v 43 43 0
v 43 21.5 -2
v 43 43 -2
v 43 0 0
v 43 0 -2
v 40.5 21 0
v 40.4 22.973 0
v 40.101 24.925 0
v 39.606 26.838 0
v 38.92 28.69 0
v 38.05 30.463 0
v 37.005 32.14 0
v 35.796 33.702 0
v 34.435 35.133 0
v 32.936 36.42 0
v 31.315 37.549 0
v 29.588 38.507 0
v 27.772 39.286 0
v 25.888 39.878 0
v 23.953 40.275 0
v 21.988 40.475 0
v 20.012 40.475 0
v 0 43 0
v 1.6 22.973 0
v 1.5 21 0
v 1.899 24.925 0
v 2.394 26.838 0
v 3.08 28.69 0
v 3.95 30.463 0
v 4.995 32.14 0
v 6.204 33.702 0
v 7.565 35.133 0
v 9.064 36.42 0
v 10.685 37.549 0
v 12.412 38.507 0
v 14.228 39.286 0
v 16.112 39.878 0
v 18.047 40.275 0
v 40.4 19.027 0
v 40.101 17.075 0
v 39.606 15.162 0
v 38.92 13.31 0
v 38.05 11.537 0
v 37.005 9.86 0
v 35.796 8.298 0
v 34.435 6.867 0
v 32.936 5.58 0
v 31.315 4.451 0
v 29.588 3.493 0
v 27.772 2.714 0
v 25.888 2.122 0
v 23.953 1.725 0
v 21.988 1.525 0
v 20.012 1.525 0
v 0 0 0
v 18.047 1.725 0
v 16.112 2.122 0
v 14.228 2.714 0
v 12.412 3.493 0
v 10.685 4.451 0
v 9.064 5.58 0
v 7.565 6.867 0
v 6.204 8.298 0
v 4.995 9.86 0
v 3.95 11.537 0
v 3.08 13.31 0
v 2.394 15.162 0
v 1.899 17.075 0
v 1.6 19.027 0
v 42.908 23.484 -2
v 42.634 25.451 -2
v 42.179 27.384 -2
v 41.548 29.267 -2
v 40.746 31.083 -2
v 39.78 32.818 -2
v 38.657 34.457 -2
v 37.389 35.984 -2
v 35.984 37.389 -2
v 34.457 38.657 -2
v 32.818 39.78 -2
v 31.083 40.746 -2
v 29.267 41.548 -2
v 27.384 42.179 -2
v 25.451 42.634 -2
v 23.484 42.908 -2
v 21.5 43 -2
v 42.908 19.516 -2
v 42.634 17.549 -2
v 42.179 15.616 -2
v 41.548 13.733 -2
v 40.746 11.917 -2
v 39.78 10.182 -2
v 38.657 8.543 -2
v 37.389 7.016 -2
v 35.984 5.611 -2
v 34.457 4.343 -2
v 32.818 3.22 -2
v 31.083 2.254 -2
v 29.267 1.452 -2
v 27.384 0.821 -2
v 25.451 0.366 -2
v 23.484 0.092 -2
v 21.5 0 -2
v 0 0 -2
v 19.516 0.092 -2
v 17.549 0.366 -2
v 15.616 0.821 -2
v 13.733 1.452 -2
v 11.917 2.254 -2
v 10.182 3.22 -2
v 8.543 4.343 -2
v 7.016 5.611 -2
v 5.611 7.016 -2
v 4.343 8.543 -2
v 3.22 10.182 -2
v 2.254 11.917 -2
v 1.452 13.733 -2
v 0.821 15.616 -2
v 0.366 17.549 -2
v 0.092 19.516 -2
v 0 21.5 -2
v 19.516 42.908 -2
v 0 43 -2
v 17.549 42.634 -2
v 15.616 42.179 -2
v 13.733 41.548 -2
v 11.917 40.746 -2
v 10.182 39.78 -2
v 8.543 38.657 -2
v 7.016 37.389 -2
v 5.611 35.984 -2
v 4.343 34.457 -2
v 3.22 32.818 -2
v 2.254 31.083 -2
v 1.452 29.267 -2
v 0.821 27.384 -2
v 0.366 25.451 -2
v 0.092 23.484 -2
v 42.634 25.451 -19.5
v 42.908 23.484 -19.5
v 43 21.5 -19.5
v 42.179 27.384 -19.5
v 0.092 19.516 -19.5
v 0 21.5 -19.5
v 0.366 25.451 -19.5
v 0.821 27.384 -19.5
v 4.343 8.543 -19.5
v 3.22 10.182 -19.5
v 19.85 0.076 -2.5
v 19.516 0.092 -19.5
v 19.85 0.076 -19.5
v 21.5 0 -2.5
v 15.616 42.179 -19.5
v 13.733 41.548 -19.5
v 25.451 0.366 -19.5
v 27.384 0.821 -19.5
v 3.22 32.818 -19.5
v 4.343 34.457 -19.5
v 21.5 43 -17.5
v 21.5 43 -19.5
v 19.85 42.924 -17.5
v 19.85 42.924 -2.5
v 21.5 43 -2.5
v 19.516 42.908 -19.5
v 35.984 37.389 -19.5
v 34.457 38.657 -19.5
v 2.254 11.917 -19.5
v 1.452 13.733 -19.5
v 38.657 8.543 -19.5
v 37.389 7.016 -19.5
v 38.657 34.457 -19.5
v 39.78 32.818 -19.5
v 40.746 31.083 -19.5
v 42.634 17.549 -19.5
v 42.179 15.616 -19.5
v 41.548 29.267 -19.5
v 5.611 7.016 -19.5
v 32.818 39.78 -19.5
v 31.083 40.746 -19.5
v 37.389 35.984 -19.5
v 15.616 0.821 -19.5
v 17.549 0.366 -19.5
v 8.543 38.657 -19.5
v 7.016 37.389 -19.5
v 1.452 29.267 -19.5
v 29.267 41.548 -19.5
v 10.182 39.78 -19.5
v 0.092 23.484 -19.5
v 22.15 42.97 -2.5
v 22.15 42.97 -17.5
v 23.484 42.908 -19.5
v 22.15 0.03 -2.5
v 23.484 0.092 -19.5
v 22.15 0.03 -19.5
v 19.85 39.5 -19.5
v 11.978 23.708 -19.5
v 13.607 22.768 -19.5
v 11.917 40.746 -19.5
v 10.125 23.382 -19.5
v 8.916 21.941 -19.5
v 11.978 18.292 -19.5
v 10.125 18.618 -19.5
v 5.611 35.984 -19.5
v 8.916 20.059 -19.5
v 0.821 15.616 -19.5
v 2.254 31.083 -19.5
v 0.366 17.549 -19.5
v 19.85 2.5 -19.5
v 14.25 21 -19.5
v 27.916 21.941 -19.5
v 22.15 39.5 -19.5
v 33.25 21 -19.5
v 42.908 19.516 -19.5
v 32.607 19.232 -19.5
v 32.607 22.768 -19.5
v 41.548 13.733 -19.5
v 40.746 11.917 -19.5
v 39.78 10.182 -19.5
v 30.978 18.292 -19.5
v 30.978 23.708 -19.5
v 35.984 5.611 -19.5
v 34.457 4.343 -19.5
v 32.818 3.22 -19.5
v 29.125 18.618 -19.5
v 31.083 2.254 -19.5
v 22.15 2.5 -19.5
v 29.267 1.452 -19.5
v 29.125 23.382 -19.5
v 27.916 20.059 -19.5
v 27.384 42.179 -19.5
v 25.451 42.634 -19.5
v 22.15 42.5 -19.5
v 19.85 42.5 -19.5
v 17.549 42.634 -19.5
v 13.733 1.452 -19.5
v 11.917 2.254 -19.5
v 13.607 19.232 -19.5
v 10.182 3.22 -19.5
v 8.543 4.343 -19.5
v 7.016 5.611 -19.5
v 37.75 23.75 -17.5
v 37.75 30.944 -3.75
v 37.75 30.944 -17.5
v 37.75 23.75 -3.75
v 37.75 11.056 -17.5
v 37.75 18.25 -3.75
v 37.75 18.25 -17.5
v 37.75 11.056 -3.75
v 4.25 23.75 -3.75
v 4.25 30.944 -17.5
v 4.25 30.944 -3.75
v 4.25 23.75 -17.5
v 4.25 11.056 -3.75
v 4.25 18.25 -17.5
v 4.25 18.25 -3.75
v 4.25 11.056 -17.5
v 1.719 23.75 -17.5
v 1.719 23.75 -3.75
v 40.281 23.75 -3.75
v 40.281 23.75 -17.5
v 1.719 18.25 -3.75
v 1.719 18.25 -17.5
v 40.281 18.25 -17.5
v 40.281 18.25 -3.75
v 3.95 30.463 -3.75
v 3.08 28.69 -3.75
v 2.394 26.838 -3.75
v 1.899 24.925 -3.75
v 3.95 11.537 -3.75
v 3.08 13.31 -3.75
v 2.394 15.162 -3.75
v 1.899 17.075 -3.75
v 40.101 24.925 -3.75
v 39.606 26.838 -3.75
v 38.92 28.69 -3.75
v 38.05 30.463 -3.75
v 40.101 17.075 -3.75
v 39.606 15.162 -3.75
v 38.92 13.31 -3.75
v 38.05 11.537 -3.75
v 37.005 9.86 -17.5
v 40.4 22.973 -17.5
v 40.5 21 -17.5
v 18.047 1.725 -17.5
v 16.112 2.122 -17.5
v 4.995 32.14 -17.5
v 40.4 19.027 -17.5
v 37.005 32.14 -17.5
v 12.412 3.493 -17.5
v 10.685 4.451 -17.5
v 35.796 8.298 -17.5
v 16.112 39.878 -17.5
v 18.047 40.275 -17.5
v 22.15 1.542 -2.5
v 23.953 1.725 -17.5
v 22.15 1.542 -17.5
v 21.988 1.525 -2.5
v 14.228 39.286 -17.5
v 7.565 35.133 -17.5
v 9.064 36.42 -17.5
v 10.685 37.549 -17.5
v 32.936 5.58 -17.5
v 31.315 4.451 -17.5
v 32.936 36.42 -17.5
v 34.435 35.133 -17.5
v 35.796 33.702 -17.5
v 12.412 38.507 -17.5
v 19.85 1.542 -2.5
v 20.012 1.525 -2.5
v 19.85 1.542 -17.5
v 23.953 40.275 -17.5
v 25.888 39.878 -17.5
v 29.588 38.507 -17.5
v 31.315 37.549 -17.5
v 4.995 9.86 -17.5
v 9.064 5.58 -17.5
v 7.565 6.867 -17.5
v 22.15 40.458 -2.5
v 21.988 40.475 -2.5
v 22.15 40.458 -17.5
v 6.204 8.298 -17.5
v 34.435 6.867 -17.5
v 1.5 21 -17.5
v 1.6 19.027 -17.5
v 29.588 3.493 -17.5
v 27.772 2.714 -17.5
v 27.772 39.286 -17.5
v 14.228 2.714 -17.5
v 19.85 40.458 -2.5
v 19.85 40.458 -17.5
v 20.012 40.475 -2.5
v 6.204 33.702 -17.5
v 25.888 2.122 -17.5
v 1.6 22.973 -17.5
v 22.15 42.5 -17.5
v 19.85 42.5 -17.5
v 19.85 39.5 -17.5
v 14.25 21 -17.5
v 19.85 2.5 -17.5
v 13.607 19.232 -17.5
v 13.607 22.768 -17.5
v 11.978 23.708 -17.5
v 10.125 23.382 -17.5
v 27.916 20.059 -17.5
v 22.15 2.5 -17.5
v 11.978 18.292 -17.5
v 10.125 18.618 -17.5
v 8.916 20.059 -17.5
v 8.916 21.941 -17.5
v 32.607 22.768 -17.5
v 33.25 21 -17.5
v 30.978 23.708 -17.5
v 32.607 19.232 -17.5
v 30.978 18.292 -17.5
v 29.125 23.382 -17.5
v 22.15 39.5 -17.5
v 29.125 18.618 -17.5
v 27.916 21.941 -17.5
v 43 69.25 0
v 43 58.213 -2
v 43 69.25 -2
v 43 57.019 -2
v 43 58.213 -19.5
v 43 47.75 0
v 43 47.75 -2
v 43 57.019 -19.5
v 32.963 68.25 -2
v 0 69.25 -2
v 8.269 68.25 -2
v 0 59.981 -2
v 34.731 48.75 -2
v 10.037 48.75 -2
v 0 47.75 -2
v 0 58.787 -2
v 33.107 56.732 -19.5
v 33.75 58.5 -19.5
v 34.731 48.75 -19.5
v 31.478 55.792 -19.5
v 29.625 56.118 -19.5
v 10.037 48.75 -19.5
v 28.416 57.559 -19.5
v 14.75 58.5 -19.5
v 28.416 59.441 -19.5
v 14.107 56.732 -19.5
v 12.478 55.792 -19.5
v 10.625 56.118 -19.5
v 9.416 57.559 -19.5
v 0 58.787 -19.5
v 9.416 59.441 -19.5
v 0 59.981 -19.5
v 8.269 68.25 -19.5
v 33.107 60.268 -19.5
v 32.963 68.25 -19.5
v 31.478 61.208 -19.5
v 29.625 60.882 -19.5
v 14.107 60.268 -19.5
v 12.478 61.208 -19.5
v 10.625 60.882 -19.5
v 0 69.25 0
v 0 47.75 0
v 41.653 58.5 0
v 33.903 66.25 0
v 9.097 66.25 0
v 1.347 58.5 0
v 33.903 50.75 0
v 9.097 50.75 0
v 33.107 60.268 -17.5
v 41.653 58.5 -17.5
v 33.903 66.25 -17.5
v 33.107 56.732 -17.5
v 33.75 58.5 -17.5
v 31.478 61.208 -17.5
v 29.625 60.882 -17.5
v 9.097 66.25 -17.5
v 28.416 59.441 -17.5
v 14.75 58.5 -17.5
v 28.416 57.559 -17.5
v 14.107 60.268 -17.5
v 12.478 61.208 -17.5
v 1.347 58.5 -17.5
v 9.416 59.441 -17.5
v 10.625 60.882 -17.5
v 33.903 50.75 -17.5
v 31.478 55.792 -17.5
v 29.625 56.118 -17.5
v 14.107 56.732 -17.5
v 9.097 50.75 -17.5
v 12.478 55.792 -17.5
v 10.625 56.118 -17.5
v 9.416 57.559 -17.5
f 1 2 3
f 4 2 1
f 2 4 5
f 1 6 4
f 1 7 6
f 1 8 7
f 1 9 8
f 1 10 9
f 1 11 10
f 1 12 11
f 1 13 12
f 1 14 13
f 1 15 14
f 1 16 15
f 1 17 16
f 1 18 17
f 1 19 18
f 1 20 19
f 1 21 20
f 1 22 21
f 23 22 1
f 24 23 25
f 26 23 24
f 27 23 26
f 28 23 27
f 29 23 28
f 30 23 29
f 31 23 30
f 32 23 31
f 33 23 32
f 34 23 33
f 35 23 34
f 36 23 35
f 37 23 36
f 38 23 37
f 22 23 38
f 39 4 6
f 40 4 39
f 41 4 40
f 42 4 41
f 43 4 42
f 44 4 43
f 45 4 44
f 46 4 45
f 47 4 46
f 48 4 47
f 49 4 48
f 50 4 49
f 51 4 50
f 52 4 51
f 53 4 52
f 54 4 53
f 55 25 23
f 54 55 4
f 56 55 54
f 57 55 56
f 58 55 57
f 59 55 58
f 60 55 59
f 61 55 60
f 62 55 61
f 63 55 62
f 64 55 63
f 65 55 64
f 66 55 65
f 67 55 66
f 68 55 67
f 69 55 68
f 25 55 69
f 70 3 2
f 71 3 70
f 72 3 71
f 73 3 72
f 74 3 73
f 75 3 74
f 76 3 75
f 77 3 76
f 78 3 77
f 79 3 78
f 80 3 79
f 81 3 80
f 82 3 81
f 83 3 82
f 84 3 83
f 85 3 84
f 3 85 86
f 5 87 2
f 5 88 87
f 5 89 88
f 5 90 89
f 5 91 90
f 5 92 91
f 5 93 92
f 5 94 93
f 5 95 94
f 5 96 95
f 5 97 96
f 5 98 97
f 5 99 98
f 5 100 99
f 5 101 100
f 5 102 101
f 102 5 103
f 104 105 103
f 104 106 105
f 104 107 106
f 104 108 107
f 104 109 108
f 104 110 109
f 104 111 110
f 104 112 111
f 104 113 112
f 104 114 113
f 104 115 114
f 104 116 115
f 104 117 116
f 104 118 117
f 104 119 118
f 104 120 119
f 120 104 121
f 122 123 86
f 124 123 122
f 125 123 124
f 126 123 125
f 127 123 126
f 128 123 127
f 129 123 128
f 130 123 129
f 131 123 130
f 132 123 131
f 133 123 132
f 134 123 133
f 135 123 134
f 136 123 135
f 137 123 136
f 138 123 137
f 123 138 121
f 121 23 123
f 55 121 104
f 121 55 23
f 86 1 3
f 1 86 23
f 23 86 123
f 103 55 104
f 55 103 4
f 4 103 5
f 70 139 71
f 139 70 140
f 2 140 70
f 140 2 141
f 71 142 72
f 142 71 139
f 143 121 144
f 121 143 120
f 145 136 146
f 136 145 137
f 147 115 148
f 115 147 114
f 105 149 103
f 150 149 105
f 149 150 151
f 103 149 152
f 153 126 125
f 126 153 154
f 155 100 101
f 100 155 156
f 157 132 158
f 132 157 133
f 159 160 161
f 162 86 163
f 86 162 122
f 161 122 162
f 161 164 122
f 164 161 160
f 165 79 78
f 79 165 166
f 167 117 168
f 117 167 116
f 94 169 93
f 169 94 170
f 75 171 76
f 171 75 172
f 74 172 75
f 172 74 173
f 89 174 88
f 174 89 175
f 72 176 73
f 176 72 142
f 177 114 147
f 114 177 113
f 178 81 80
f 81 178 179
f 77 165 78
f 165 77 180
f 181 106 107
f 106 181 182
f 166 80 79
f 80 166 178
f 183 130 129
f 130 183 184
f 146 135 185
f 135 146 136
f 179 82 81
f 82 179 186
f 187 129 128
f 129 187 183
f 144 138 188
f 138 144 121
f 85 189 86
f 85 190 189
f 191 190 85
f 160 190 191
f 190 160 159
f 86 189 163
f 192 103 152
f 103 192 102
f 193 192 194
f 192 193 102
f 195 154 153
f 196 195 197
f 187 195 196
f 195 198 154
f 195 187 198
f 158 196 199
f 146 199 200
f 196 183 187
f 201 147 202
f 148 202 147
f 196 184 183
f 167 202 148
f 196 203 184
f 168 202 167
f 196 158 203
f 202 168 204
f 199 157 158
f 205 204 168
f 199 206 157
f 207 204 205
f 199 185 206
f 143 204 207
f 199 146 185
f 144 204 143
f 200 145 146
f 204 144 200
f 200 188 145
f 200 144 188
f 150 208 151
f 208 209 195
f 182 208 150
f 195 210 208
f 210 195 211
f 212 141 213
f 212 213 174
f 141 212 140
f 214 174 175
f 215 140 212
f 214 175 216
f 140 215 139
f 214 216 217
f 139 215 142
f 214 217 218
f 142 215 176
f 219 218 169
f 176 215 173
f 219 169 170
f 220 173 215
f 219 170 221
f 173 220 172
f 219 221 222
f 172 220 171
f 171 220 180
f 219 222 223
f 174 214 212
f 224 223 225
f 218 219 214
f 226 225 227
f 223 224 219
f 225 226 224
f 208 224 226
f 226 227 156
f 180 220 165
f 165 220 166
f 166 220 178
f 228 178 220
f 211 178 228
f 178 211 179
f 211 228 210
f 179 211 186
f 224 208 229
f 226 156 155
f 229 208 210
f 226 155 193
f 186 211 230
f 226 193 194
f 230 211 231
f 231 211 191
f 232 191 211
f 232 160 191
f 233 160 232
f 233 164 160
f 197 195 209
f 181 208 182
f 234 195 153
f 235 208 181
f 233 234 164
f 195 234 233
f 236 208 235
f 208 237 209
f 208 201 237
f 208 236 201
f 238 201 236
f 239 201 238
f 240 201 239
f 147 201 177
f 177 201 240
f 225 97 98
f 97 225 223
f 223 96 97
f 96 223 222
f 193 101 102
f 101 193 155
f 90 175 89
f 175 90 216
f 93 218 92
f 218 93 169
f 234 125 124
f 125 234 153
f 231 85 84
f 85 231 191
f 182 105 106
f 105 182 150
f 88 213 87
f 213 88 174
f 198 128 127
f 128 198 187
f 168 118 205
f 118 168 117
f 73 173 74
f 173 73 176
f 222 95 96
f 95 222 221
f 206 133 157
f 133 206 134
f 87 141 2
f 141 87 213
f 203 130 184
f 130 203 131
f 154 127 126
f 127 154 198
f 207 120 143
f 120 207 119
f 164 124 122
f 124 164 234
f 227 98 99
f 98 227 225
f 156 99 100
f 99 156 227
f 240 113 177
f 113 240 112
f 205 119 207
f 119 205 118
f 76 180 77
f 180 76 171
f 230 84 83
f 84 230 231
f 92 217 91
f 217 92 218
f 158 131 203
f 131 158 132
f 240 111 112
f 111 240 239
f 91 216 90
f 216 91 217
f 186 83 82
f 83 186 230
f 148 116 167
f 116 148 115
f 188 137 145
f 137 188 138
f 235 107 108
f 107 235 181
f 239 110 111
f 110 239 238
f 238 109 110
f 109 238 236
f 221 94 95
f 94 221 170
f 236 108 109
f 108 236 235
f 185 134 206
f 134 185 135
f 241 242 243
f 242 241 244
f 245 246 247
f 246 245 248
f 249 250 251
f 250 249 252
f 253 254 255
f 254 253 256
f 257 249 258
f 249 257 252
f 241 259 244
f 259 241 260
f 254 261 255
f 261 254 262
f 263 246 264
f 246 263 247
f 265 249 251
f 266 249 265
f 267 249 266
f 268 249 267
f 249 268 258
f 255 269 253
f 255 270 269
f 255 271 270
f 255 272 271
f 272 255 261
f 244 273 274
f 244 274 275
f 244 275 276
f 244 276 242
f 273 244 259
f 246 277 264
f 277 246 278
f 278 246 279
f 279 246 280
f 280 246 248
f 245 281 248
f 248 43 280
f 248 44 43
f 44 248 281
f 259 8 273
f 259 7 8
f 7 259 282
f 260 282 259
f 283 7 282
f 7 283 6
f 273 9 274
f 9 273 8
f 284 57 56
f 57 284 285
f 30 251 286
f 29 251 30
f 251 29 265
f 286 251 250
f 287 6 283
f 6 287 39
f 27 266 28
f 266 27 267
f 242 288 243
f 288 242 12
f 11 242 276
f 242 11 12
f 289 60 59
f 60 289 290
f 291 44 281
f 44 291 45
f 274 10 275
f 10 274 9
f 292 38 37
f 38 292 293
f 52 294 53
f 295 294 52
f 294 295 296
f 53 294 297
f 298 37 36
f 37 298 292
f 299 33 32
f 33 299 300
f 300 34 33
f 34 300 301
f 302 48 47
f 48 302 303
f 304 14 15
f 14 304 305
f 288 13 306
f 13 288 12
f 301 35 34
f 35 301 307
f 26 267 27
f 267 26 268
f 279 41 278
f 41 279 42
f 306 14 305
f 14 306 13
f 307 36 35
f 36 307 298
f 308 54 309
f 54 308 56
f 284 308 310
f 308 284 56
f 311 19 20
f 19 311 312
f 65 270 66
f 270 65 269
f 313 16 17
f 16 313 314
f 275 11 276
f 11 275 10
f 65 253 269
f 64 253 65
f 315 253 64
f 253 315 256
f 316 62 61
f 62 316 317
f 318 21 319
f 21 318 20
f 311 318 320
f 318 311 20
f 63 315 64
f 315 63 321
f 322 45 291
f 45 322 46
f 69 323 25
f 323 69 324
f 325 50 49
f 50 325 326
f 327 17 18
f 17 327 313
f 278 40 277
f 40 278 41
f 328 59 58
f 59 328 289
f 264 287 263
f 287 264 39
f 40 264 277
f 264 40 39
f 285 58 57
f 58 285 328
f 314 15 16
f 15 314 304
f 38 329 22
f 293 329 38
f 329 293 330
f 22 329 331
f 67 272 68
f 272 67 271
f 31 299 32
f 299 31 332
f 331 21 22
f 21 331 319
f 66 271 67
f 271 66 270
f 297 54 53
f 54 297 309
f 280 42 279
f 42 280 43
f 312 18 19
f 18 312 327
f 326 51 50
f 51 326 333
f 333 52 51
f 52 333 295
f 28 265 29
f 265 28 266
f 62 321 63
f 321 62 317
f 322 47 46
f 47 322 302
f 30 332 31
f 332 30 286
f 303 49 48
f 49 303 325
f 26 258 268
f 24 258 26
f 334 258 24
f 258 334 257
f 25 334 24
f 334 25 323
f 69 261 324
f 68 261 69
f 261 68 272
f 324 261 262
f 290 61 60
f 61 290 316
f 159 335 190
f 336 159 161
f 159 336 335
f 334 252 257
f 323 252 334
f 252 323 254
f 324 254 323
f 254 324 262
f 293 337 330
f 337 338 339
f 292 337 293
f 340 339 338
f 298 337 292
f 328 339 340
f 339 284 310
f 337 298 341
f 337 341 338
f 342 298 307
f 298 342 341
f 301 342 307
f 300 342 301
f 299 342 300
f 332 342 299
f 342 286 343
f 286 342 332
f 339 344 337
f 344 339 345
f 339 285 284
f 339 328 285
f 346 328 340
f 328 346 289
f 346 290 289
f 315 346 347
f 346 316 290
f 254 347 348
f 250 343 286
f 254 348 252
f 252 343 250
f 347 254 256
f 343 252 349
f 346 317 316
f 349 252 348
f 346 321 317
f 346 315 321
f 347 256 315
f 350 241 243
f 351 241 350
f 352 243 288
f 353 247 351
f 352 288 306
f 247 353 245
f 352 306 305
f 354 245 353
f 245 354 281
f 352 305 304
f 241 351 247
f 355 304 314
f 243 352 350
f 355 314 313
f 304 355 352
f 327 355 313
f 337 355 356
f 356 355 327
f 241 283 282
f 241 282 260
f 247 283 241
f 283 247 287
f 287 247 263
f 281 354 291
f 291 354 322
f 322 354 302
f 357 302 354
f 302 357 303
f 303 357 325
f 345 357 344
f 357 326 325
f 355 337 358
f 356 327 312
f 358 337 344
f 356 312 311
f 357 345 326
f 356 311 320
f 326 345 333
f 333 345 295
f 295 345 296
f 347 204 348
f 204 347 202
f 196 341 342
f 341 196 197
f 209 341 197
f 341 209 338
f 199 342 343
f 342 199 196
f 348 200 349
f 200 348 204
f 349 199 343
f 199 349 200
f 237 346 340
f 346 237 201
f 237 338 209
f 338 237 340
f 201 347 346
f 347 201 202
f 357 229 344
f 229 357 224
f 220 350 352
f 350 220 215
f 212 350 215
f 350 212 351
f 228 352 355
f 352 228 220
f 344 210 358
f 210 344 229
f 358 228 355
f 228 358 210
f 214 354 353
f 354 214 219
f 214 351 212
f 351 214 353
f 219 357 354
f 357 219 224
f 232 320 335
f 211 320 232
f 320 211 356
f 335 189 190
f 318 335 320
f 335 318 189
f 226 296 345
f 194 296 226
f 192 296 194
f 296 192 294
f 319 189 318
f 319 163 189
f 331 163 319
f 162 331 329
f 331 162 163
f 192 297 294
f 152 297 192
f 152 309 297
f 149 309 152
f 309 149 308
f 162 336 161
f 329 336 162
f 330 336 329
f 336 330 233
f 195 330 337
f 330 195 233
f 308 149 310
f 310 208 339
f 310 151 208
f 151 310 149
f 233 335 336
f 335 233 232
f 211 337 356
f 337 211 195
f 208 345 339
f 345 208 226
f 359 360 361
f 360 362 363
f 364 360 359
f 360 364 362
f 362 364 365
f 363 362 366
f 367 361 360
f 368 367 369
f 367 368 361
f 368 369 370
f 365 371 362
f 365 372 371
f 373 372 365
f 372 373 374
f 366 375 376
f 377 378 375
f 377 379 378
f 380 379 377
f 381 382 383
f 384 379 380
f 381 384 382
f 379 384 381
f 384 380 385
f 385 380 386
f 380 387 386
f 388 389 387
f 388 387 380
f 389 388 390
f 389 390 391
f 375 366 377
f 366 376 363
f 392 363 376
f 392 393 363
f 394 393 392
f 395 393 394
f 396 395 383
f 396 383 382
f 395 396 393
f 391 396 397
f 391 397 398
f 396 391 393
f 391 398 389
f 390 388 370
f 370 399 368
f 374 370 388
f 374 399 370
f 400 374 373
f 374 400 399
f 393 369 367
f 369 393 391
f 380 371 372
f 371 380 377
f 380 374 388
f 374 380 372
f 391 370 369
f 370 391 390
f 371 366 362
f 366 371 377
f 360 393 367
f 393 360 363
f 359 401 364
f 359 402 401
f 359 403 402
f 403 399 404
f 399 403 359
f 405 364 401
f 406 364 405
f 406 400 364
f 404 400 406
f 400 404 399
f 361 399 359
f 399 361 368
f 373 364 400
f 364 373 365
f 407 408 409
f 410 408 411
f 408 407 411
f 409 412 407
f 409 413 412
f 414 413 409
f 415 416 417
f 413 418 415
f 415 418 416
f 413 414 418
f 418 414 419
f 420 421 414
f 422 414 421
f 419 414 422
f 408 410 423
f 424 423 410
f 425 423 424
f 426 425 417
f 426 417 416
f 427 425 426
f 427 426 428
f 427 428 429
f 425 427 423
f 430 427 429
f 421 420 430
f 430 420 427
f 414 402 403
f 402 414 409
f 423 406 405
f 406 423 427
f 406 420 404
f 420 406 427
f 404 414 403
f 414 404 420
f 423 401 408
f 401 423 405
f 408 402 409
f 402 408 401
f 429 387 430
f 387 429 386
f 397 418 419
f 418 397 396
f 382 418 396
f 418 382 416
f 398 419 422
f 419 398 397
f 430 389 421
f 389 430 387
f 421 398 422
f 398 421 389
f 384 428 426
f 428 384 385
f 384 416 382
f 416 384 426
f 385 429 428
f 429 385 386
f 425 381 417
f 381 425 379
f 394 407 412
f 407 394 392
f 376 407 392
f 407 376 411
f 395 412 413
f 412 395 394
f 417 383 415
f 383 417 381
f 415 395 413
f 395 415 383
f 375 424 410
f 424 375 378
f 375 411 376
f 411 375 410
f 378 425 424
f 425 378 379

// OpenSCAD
// This is all licensed as CC-BY-SA. See COPYING for details
// Note: these haven't been certified or anything. But they look about right

$fa = 1;
wall_thickness = 2;

// Units: mm
module schucko() {
  // results: origin is top min(x,y) corner
  // DIN 49440-1
  difference() {
    union() {
      translate(v=[0,0,-wall_thickness])
	cube(size=[(19.5 + wall_thickness) * 2, (19.5 + wall_thickness) * 2, wall_thickness]);
      translate(v=[19.5 + wall_thickness, 19.5 + wall_thickness,-17.5 - wall_thickness])
	cylinder(r=19.5 + wall_thickness, h=17.5 + wall_thickness);
    }
    
    
    translate(v=[21,21,-17.5]) {
      union() {
	intersection() {
	  cylinder(r=19.5, h=18);
	  union() {
	    cube(size = [33.5, 40, 70], center=true); // z=35, because we go way out the top
	    cube(size = [40, 5.5, 70], center = true);
	    translate(v=[0,0,17.5]) {
	      cube(size = [40, 40, 7.5], center = true);
	    }
	  }
	}
	// The holes
	translate(v=[-9.5,0,-20]) {
	  cylinder(r=2.75, h=21);
	}
	translate(v=[9.5,0,-20]) {
	  cylinder(r=2.75, h=21);
	}
	// The side bits...
	translate(v=[0,0,7.5]) {
	  cube(size=[2.3, 45, 15], center=true);
	}
	translate(v=[0,20,0]) {
	  cube(size=[2.3, 3, 4], center=true);
	}
	translate(v=[0,-20,0]) {
	  cube(size=[2.3, 3, 4], center=true);
	}
      }
    }
  }
}

module europlug() {
  translate(v=[19.5 + wall_thickness,8.5,0]) {
    difference() {
      union() {
	translate(v=[0,0,wall_thickness / 2])
	  cube(size=[(19.5 + wall_thickness) * 2, (17.5 + wall_thickness * 2), wall_thickness], center=true);
	//	cube(42, 17.5, 17.5);
	translate(v=[0,0,-8.75]) {
	  intersection() {
	    cube(size=[(19.5 + wall_thickness) * 2, 15.5 + wall_thickness * 2, 17.5], center=true);
	    rotate(a=[0,0,45])
	      cube(size=[30,28.5 + wall_thickness * 2,17.5], center=true);
	  }
	}
      }
      translate(v=[0,0,-6.5]) {
	intersection() {
	  cube(size=[42, 15.5, 18], center=true);
	  rotate(a=[0,0,45])
	    cube(size=[28.5, 28.5, 18], center=true);
	}
      }
      // The holes
      translate(v=[-9.5,0,-35]) {
	cylinder(r=2.75, h=21);
      }
      translate(v=[9.5,0,-35]) {
	cylinder(r=2.75, h=21);
      }
      
    }
  }
}

difference() {
  union() {
    
    schucko();
    
    translate(v=[0, 50, -2]) { // 45 is lined up.
      europlug();
    }
  }

  //cube(size=[42,160,160], center=true);
}
